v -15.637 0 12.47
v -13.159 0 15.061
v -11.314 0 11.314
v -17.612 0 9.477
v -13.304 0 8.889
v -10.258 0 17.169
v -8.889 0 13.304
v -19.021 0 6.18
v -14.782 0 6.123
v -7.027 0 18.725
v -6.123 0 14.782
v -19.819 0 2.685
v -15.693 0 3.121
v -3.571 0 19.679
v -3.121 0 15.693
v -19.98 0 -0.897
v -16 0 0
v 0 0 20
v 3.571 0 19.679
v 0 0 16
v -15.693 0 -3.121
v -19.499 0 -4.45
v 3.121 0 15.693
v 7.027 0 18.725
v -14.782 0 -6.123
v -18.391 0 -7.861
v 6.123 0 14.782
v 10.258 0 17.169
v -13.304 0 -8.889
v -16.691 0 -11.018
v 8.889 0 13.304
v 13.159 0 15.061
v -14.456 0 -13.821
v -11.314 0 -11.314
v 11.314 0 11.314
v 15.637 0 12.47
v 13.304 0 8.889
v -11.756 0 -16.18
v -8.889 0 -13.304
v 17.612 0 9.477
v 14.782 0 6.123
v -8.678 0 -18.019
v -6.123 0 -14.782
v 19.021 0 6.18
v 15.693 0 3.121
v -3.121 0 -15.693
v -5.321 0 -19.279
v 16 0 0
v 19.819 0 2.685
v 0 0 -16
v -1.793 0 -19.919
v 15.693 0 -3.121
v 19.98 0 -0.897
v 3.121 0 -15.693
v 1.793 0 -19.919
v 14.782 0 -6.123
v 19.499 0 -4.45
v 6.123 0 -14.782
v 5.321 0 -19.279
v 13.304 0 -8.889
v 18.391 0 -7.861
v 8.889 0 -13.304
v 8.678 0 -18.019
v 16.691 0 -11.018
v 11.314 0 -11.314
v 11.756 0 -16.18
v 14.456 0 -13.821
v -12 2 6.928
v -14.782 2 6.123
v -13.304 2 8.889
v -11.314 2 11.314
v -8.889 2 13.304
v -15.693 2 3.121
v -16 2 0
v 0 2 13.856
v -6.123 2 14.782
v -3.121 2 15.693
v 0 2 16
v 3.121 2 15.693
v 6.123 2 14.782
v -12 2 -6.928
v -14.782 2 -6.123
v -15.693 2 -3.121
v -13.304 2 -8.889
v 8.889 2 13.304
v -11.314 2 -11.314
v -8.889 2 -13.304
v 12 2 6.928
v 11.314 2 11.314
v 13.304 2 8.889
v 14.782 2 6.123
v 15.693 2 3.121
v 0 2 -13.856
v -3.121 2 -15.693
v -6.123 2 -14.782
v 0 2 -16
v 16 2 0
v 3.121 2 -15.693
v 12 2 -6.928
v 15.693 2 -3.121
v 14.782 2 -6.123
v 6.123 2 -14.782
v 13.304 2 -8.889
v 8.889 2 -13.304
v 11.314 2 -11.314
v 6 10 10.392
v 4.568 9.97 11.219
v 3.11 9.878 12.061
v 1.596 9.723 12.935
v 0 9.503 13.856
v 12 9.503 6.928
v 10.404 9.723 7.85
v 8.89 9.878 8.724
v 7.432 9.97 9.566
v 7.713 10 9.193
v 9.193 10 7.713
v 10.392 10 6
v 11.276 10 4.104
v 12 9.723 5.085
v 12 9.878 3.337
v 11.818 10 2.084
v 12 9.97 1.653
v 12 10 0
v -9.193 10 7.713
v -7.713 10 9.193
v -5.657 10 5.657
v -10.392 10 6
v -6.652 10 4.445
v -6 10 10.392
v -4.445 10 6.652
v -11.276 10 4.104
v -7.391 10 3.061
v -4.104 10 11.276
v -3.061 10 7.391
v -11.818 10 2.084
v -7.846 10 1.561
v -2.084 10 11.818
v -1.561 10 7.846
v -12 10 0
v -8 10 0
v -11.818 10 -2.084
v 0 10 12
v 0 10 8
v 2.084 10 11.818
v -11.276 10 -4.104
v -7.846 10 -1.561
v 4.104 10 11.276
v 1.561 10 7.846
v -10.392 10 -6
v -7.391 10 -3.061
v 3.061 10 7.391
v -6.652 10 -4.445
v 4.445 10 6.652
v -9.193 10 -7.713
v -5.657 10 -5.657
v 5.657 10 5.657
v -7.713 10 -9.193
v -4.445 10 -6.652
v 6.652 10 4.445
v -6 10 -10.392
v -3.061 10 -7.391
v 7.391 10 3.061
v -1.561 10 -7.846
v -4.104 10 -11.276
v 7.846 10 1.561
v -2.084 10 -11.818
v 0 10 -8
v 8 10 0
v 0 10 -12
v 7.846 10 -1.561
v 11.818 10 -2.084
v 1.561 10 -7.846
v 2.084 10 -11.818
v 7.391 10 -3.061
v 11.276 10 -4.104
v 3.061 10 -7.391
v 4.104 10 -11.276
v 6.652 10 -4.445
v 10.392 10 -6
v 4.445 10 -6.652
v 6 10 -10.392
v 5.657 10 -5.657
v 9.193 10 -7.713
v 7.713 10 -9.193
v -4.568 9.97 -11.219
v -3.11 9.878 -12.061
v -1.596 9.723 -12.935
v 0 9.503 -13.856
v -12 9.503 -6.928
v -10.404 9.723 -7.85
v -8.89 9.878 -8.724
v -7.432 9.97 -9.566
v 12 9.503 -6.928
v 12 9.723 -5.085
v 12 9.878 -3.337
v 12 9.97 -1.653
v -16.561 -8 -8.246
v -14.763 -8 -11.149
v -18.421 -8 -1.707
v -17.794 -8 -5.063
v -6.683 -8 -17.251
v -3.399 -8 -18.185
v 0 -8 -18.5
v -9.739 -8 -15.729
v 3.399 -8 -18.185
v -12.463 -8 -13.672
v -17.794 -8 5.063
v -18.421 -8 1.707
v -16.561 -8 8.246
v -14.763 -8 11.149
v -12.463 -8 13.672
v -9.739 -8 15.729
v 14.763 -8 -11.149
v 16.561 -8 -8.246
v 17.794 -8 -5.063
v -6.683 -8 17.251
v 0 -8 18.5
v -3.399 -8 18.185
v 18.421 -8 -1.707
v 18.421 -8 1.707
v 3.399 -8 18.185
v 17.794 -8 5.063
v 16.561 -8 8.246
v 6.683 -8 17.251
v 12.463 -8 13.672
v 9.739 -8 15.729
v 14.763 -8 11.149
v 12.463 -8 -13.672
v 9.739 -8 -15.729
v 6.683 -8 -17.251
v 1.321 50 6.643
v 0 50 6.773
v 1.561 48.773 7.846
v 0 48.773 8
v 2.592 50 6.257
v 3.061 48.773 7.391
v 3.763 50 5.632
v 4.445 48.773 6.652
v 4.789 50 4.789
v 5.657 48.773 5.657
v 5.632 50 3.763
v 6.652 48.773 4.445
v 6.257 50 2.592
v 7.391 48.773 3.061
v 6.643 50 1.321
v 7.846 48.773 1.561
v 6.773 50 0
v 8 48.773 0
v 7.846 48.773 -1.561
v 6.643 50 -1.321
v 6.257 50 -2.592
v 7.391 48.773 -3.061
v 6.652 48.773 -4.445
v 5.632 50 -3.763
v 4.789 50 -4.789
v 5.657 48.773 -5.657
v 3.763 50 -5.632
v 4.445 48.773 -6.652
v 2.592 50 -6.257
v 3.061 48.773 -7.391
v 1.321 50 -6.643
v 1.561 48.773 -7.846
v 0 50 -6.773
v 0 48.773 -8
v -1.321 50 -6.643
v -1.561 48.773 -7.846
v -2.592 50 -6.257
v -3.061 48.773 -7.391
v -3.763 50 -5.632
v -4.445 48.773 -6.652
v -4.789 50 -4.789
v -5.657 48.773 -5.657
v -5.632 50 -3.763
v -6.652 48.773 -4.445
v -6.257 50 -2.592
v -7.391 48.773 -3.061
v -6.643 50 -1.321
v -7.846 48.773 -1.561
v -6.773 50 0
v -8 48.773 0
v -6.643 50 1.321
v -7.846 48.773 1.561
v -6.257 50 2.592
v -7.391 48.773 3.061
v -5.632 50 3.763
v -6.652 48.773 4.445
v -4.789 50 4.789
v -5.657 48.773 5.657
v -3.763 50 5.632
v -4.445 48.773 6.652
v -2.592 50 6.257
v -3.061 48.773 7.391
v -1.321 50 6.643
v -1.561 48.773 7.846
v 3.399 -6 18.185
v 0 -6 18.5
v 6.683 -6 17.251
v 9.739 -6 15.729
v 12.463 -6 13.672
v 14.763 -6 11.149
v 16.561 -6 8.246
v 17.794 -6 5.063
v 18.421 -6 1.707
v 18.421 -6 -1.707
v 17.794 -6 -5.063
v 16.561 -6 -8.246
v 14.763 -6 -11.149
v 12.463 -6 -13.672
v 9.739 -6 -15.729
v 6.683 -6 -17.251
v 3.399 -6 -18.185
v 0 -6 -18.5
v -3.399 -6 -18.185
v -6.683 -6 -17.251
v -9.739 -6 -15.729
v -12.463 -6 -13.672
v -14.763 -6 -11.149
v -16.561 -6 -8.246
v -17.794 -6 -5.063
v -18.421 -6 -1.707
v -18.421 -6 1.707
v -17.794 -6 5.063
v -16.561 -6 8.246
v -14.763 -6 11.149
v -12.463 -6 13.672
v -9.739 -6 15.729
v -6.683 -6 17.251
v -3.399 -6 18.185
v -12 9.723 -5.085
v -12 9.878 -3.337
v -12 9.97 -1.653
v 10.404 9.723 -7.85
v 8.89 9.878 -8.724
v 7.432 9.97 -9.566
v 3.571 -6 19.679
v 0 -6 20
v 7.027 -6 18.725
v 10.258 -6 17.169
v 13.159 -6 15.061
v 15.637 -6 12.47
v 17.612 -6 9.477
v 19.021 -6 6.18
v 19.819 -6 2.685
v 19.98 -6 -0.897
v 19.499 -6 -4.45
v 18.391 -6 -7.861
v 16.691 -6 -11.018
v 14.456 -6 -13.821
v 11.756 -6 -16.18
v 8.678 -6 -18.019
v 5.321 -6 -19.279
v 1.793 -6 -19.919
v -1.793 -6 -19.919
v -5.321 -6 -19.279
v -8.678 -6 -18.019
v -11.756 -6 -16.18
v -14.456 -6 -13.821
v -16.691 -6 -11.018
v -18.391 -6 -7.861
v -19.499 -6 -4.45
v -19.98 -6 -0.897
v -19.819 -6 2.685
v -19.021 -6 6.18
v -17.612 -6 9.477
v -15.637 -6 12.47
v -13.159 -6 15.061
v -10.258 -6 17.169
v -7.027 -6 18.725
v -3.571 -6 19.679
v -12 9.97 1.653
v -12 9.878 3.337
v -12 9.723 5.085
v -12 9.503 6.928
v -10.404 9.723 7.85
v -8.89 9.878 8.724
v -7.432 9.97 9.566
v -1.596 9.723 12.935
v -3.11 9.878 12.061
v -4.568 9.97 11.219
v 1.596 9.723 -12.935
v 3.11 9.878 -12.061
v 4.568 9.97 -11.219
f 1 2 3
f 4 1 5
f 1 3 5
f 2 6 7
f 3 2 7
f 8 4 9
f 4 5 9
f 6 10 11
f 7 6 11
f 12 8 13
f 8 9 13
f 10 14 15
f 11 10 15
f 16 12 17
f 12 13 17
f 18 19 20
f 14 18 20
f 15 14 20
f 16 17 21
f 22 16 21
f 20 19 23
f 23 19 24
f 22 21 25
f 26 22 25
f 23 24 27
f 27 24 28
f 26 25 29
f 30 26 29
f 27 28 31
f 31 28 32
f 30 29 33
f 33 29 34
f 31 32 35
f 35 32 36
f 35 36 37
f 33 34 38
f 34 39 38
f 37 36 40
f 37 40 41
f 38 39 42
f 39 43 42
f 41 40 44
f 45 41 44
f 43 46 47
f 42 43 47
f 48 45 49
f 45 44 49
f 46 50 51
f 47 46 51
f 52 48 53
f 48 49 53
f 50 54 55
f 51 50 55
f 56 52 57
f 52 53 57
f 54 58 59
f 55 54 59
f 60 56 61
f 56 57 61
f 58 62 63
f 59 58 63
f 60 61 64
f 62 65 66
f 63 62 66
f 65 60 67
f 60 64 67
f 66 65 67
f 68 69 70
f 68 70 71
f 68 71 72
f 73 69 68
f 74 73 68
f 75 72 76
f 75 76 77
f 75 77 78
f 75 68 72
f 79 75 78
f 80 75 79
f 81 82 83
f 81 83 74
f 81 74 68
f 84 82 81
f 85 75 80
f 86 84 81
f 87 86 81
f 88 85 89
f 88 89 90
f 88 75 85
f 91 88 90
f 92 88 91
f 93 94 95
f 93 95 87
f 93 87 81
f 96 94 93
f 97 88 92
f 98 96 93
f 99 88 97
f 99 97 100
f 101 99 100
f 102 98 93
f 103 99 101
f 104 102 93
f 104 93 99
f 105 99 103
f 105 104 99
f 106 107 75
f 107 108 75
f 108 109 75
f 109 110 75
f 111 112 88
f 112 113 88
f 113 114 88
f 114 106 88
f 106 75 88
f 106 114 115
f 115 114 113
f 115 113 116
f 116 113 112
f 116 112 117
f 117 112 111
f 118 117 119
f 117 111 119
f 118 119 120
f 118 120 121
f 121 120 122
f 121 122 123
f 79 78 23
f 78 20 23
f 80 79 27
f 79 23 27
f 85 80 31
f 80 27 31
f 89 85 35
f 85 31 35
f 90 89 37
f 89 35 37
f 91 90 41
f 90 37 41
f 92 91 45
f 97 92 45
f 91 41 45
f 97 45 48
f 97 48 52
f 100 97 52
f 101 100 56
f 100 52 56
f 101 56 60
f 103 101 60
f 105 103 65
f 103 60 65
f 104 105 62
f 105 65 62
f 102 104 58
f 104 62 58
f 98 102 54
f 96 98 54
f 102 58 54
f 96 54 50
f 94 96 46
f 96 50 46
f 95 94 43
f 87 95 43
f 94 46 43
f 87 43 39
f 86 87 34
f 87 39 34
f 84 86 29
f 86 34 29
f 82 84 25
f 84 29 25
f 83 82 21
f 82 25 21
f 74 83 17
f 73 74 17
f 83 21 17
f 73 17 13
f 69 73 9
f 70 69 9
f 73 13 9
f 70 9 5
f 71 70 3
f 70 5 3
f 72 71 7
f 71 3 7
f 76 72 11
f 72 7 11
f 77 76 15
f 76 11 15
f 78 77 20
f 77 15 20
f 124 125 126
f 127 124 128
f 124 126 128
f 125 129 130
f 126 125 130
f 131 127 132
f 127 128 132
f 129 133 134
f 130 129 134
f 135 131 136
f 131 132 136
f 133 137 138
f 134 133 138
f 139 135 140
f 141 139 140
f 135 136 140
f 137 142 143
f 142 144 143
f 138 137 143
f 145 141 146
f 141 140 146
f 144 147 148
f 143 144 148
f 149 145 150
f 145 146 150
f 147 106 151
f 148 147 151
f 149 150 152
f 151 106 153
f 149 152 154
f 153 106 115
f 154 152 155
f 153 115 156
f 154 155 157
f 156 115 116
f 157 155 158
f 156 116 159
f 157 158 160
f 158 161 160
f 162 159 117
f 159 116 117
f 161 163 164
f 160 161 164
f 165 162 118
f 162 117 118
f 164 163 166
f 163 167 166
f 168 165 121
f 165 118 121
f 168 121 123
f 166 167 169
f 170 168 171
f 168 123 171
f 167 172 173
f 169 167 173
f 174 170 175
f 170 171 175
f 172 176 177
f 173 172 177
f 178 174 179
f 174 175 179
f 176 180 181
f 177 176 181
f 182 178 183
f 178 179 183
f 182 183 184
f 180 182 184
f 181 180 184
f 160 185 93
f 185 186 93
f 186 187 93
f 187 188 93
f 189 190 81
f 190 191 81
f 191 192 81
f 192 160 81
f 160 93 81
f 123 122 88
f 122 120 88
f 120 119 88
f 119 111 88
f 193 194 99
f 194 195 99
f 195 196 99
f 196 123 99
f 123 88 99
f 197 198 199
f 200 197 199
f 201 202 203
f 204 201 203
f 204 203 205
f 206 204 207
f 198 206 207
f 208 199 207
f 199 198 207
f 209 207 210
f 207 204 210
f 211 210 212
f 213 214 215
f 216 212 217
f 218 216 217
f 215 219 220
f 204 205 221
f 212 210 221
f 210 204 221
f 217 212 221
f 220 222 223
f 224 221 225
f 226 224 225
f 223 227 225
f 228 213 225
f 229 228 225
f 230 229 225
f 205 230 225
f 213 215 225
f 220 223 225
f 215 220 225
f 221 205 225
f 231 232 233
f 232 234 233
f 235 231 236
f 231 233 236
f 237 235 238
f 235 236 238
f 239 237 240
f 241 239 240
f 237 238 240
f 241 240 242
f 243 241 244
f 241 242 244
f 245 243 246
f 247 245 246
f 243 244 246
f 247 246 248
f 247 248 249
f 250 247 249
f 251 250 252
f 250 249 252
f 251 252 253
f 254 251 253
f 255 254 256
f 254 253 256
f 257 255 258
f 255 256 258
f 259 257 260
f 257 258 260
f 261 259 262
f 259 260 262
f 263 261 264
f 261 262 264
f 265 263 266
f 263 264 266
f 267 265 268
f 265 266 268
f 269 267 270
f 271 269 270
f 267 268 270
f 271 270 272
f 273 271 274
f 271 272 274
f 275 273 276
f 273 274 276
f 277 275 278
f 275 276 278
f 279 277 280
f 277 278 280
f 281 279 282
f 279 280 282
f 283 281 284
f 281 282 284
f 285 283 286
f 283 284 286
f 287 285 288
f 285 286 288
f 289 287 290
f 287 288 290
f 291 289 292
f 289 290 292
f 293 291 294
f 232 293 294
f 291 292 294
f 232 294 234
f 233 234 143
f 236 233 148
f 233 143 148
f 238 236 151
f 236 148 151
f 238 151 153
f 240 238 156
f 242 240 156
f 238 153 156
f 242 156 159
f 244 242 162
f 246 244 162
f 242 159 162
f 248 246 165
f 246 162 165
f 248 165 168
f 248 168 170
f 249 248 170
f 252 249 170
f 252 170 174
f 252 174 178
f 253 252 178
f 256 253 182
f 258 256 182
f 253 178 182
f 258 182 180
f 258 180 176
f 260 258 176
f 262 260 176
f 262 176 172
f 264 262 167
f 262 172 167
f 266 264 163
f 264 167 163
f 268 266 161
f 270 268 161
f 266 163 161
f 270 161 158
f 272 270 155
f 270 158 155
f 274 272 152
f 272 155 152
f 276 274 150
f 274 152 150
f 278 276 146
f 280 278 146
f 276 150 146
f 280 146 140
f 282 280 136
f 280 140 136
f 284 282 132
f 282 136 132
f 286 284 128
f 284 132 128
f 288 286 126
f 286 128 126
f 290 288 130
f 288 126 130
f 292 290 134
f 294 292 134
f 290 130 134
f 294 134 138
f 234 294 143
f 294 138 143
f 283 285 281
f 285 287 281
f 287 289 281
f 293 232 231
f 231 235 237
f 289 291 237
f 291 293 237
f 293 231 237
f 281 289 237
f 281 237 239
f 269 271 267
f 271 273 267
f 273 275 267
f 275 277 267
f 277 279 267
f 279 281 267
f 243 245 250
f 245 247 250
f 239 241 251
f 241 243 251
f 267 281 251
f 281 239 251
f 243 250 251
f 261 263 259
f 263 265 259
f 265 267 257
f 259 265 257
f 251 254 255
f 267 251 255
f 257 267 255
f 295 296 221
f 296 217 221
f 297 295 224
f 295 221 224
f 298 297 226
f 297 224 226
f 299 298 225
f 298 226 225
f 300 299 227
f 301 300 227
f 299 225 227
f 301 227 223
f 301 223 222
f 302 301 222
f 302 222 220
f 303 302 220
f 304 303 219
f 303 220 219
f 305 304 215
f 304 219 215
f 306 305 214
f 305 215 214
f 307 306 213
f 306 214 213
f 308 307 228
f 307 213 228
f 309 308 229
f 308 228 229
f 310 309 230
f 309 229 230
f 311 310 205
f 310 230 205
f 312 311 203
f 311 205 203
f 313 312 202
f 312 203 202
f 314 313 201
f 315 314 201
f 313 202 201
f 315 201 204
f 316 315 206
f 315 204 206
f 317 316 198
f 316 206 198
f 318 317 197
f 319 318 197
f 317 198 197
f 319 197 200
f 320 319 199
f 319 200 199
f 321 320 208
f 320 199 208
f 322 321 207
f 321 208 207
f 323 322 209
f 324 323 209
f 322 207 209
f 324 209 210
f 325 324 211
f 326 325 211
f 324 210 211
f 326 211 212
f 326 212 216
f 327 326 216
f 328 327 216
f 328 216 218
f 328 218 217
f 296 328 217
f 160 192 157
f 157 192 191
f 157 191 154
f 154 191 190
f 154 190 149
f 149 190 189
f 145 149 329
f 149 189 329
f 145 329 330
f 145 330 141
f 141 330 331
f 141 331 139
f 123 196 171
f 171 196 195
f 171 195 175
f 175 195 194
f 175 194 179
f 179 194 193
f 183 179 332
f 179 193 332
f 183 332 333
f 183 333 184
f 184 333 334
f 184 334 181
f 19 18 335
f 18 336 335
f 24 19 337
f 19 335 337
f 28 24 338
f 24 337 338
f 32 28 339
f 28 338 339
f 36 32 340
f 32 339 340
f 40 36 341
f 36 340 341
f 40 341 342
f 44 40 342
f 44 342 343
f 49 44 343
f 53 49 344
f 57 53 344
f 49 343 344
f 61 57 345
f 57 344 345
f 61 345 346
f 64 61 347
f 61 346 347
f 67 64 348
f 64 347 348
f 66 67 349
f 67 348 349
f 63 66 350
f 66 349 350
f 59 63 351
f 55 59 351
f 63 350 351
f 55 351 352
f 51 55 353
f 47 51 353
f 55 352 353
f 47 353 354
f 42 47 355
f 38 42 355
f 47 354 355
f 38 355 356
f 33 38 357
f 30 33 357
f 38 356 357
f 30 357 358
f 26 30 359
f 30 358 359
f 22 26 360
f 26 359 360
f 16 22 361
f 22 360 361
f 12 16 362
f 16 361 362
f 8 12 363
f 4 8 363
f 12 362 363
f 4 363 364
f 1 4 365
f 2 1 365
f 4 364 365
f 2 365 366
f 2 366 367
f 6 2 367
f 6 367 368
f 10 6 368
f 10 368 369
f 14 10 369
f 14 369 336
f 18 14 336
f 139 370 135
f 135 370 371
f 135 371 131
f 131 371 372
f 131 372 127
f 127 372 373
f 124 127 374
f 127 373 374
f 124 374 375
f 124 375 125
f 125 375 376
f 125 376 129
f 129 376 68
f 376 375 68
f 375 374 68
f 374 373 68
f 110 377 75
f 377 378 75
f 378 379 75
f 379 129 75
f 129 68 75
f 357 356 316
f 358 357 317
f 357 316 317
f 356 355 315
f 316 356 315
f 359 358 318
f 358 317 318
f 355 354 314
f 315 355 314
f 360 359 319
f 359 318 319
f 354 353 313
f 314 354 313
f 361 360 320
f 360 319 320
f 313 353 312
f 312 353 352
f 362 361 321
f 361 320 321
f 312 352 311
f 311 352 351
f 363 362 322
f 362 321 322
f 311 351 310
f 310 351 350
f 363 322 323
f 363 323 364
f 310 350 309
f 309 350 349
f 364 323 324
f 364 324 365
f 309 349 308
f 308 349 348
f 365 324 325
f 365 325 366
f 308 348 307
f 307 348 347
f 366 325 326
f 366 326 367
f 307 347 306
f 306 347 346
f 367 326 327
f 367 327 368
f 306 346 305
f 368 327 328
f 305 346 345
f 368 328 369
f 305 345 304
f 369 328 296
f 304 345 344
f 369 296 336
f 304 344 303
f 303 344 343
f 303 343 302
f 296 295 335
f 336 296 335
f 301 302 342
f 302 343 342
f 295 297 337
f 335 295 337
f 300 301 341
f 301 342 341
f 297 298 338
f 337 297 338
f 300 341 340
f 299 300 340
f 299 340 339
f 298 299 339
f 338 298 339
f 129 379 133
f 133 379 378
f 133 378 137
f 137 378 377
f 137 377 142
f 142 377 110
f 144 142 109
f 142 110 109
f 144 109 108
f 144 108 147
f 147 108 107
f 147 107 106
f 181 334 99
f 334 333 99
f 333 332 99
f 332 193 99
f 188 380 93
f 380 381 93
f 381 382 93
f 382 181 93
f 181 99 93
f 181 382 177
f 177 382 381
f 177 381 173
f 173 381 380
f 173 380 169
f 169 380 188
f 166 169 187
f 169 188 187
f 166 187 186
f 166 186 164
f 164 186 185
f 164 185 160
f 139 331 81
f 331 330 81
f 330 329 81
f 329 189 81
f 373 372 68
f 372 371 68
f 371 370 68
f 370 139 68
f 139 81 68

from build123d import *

# Parameters (mm, degrees)
SKETCH_2_R          = 17
CUT_EXTRUDE_1_DEPTH = 10


with BuildPart() as part:
    # 草图1 → 旋转1 (revolve)
    with BuildSketch(Plane.XY):
        Polygon((0, 50), (6.773, 50), (8, 48.773), (8, 10), (12, 10), (15, 9.196152423), (15, 2), (16, 2), (16, 0), (20, 0), (20, -6), (18.5, -6), (18.5, -8), (0, -8), align=None)
    revolve(axis=Axis((0, -8, 0), (0, 1, 0)))

    # 草图2 → 切除-拉伸1 (cut)
    with BuildSketch(Plane(origin=(0, 2, 0), x_dir=(1, 0, 0), z_dir=(0, 1, 0))):
        Circle(SKETCH_2_R)
        Polygon((-12, -6.92820323), (0, -13.856406461), (12, -6.92820323), (12, 6.92820323), (0, 13.856406461), (-12, 6.92820323), align=None, mode=Mode.SUBTRACT)
    extrude(amount=CUT_EXTRUDE_1_DEPTH, mode=Mode.SUBTRACT)


solid = part.part
